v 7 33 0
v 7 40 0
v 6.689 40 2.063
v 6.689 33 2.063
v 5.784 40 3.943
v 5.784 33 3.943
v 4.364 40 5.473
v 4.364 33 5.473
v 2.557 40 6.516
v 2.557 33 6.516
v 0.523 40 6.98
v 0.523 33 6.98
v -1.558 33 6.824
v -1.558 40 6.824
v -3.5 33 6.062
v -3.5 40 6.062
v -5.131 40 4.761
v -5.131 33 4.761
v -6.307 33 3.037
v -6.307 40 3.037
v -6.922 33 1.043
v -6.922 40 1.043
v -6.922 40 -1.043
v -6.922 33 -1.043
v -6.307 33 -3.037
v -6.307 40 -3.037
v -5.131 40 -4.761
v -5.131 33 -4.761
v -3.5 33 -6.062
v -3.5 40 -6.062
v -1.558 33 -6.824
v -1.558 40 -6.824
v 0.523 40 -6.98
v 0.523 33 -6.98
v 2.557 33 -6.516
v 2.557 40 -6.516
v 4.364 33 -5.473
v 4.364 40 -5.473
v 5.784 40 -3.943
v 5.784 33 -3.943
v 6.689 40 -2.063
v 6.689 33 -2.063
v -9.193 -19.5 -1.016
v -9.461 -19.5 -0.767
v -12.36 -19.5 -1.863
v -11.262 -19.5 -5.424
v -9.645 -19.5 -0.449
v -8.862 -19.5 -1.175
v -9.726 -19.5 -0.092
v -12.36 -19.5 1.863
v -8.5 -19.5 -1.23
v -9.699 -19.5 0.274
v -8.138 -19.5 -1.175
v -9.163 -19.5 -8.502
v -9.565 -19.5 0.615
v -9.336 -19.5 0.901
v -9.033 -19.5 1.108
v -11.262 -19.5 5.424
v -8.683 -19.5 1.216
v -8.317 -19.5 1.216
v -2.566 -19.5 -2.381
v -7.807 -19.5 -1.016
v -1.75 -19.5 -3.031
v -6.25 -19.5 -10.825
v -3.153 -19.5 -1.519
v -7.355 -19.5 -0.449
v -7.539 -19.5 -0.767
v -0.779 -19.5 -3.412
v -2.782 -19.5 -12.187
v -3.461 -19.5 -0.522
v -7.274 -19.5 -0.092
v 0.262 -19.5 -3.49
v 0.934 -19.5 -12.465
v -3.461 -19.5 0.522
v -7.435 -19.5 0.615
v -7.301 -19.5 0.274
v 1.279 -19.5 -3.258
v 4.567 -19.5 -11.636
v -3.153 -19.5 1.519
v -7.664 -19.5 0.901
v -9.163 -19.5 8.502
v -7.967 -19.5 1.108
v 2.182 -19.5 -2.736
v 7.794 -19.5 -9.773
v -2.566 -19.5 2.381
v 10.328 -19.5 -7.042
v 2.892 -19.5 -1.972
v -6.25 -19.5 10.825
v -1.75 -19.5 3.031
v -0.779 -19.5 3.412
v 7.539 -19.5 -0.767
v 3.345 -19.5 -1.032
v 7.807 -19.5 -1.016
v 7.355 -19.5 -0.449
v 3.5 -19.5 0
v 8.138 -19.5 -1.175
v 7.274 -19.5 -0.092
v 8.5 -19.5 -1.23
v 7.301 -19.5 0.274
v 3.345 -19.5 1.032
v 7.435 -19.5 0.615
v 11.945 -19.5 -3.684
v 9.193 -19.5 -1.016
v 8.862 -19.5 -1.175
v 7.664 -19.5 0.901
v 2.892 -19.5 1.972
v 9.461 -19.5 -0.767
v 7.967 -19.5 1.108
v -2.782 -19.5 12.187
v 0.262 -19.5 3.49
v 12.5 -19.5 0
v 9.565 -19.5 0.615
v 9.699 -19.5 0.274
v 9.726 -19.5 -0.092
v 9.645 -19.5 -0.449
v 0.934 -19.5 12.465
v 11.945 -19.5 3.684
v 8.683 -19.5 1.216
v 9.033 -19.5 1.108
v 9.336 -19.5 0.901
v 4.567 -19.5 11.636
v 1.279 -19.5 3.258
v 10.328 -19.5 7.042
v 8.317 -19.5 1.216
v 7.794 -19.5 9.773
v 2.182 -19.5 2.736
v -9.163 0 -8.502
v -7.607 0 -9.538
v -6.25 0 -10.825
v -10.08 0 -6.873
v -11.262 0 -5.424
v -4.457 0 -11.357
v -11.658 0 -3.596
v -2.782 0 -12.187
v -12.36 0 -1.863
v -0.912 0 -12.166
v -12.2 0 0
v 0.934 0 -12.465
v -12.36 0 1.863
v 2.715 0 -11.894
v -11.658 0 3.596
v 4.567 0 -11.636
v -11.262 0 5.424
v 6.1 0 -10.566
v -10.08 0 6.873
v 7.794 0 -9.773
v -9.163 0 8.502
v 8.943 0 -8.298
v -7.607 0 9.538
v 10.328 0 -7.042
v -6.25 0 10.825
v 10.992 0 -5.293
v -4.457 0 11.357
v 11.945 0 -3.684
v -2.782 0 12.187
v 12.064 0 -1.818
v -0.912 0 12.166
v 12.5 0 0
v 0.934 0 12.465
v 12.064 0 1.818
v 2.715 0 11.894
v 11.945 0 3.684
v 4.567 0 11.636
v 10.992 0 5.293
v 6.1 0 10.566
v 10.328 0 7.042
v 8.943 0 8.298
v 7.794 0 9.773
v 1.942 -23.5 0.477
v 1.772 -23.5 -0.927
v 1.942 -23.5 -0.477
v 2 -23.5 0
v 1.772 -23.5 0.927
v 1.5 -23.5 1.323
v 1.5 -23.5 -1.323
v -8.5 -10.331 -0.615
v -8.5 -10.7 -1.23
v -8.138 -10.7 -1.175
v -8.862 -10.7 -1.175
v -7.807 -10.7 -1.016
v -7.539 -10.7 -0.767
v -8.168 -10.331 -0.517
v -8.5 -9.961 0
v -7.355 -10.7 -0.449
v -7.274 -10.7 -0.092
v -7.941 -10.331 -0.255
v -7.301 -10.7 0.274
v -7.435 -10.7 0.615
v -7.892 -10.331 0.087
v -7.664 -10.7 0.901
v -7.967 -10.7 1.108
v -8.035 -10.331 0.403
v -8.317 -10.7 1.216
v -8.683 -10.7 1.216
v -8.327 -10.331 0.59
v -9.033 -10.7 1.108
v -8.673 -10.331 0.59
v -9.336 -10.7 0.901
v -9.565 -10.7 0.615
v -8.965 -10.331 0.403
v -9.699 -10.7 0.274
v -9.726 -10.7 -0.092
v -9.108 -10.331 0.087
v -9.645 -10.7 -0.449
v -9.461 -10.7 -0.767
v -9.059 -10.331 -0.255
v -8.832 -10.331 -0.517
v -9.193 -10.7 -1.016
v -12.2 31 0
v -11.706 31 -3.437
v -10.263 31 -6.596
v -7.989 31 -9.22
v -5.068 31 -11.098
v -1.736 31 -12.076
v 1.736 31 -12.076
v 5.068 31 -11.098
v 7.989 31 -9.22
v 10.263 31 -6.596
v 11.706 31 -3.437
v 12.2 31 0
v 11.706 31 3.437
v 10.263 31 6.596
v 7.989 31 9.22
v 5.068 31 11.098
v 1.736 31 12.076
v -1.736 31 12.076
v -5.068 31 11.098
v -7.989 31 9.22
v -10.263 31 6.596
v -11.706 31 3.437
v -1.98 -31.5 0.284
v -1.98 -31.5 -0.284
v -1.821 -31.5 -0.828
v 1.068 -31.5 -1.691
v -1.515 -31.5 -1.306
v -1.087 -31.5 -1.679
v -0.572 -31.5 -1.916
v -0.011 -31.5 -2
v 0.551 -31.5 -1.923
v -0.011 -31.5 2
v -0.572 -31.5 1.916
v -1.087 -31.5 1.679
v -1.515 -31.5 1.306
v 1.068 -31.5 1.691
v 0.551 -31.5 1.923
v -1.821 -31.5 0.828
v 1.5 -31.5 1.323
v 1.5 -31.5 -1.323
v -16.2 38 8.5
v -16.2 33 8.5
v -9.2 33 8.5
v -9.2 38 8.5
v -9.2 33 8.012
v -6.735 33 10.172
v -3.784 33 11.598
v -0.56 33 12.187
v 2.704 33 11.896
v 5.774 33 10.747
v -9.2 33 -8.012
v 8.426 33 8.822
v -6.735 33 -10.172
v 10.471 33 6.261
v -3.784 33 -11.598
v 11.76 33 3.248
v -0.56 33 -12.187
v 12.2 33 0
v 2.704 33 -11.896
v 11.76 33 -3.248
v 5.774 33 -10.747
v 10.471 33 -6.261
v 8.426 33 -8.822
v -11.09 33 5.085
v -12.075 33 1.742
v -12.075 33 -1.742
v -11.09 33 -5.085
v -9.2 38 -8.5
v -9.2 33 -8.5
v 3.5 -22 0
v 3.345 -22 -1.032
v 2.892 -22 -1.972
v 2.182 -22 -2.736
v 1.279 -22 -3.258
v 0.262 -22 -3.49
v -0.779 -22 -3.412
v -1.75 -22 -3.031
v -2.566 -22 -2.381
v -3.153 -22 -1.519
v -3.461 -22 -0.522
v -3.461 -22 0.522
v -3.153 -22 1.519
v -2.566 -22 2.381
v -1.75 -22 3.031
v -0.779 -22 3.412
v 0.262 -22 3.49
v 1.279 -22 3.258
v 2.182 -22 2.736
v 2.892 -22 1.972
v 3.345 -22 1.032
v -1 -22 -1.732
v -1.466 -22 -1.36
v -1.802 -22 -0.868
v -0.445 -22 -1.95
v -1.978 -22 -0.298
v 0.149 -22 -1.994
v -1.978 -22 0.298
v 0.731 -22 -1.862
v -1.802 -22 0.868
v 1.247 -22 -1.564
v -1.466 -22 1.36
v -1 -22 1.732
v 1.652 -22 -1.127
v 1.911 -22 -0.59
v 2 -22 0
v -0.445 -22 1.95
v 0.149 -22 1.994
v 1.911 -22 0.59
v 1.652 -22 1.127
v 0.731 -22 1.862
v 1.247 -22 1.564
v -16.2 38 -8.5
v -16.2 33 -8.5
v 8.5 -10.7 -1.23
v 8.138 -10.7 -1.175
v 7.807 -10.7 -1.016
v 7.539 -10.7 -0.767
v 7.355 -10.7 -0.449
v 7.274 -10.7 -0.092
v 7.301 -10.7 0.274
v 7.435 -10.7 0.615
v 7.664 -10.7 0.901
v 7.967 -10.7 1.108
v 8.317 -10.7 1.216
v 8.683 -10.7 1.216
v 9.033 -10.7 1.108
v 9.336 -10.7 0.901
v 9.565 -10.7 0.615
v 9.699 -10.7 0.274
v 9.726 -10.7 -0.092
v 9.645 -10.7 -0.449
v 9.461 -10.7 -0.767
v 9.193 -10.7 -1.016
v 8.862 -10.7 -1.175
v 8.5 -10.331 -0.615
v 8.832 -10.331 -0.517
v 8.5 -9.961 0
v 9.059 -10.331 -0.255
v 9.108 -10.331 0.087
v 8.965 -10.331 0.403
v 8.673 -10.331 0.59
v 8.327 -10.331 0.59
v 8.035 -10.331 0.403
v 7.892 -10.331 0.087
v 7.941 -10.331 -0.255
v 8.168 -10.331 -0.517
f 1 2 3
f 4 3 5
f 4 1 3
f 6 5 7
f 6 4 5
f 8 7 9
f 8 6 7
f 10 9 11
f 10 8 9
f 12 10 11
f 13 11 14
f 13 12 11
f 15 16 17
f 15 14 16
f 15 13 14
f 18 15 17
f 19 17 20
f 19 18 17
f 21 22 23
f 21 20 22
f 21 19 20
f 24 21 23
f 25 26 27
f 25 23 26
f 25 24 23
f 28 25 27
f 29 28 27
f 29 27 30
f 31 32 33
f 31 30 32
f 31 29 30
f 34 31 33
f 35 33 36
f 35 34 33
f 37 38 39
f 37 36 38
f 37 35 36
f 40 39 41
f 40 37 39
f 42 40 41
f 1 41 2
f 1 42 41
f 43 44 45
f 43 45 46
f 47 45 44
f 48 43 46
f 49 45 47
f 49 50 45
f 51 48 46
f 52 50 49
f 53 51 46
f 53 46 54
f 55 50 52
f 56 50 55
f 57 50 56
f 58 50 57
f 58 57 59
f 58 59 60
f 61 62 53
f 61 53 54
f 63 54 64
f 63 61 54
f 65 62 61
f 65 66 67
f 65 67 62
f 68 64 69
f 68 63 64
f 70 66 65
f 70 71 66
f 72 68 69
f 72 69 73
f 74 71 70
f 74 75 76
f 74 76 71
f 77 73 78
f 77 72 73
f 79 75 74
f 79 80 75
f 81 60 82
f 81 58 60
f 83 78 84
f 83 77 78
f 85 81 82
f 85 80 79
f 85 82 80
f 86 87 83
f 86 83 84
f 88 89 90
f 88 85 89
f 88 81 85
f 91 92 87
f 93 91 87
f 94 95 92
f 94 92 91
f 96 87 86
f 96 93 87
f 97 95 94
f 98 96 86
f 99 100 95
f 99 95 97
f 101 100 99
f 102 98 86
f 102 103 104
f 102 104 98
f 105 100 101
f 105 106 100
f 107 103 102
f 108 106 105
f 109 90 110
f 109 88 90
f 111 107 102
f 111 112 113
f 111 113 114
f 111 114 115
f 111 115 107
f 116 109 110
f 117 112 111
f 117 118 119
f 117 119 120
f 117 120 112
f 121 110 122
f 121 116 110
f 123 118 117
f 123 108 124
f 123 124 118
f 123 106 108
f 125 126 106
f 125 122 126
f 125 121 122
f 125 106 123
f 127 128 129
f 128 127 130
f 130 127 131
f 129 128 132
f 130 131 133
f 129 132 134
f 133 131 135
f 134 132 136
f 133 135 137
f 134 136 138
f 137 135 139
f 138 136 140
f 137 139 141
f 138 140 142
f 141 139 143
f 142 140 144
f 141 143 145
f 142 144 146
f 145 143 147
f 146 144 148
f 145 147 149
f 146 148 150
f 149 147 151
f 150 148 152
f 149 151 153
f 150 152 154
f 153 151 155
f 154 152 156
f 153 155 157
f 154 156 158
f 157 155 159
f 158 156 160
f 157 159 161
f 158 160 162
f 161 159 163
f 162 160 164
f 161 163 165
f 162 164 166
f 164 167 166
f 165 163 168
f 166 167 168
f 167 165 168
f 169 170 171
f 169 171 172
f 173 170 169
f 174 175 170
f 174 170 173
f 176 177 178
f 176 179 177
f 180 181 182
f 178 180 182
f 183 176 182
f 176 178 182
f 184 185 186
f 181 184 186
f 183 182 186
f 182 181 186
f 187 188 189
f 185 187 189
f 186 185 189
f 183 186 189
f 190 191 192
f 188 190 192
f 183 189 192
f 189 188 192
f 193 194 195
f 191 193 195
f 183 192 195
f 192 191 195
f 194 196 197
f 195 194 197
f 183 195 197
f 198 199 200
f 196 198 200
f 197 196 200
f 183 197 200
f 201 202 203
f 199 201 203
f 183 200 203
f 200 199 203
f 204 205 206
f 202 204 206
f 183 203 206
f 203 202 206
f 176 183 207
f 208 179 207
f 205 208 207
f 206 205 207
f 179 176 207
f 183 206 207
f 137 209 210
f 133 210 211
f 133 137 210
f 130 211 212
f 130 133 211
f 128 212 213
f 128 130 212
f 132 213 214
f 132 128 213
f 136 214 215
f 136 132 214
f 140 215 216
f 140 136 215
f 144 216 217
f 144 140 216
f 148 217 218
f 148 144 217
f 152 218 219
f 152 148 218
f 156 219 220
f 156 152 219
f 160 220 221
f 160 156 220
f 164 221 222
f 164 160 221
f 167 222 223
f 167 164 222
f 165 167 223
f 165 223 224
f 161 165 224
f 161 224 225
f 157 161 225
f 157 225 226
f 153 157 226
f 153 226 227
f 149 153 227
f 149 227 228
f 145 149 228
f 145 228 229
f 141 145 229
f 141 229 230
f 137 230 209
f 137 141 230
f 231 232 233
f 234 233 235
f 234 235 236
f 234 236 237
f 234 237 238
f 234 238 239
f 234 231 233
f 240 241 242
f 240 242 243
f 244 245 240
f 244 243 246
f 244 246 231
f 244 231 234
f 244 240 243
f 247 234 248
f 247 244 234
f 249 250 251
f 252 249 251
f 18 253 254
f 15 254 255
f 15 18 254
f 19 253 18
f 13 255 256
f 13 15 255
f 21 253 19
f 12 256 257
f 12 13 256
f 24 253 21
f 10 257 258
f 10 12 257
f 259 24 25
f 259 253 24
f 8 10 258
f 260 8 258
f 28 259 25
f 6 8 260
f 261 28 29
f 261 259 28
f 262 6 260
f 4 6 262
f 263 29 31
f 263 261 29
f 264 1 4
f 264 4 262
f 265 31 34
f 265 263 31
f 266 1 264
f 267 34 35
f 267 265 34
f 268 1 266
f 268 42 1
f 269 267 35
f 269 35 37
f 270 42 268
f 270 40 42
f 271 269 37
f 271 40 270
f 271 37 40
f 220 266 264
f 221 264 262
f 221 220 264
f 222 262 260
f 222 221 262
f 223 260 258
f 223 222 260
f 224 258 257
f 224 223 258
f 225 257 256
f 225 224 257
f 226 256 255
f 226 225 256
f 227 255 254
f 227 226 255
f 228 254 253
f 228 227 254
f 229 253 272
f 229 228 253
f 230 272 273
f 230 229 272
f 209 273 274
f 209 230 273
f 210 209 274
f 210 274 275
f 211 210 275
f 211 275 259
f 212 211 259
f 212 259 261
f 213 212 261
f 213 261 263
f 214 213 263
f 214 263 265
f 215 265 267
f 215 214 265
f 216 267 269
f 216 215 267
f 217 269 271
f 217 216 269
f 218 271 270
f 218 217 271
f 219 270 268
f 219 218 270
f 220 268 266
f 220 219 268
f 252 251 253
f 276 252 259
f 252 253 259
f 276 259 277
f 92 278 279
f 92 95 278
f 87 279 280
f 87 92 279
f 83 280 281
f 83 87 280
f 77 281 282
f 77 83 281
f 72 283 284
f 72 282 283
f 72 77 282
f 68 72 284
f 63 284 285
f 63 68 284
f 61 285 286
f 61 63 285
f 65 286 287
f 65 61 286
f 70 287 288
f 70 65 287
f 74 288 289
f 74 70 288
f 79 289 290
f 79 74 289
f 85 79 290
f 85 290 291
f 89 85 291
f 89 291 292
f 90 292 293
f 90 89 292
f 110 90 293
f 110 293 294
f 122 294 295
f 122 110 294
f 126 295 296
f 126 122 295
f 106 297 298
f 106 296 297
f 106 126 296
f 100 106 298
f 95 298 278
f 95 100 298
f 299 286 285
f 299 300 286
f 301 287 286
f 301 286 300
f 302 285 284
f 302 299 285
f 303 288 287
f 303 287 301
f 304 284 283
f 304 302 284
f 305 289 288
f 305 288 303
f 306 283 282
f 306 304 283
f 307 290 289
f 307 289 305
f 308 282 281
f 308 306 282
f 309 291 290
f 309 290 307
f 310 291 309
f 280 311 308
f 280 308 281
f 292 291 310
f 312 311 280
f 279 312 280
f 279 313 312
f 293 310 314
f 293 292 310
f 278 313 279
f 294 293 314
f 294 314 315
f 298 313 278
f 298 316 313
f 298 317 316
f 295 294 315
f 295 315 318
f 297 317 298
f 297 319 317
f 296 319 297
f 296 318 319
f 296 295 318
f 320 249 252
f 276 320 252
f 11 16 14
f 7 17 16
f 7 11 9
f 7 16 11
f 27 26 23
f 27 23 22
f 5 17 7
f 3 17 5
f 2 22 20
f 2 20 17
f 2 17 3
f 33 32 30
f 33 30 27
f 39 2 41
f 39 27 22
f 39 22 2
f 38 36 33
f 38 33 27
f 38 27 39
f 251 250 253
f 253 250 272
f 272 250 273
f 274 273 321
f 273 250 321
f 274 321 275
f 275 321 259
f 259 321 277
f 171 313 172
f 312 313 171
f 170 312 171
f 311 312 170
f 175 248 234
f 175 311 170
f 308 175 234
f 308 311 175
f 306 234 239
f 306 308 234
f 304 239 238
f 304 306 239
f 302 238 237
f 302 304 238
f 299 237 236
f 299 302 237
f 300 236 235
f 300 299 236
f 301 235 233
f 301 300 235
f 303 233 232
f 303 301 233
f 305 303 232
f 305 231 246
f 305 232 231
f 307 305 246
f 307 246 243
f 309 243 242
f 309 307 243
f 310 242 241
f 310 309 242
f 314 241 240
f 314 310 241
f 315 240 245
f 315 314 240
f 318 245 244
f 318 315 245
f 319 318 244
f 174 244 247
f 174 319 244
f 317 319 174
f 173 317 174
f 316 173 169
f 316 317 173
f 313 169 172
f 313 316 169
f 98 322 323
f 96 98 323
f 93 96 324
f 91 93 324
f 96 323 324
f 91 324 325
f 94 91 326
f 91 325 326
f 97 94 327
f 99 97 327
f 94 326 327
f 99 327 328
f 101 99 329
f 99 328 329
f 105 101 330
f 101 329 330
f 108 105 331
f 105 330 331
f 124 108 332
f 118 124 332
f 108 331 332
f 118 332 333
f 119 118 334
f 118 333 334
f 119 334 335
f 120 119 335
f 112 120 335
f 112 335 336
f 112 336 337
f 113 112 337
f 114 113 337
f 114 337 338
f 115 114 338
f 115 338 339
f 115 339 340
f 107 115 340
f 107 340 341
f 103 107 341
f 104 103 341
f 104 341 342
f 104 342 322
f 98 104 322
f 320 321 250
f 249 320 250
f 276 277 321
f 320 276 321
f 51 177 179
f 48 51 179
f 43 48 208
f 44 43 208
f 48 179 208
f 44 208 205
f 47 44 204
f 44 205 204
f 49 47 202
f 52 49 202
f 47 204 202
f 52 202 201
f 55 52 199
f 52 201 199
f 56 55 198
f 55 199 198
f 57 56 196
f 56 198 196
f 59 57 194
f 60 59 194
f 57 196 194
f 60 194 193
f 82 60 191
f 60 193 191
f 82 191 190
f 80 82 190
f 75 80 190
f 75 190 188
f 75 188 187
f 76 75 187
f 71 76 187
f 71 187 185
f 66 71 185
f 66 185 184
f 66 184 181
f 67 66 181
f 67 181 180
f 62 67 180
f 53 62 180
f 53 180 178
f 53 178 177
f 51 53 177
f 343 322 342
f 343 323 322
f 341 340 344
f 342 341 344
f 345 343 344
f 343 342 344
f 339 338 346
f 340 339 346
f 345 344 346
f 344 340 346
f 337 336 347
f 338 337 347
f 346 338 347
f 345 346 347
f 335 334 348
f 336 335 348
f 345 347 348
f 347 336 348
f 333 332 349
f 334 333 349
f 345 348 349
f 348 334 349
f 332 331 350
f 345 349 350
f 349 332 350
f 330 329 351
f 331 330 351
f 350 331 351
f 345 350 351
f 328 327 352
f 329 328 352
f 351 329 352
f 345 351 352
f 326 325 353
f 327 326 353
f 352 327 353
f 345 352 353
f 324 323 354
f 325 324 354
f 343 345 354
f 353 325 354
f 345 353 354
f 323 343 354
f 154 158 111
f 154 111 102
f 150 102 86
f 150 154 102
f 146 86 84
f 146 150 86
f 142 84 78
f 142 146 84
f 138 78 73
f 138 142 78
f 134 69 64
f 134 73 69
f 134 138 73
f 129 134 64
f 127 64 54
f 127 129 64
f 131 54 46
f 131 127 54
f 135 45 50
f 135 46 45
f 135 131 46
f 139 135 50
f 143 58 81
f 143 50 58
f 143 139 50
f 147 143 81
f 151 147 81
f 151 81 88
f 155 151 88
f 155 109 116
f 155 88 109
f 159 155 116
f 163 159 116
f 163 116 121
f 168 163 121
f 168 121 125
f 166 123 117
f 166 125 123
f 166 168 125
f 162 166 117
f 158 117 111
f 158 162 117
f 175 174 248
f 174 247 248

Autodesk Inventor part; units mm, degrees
ref_plane "YZ Plane" through (0, 0, 0) normal (1, 0, 0) x (0, 1, 0)
ref_plane "XZ Plane" through (0, 0, 0) normal (0, 1, 0) x (-1, 0, 0)
ref_plane "XY Plane" through (0, 0, 0) normal (0, 0, 1) x (1, 0, 0)
sketch "Schizzo1" plane through (0, 0, 0) normal (0, 1, 0) x (-1, 0, 0)
  circle A0 centre (0, 0) radius 12.2
  dimension "d0" = 24.4
extrude "Estrusione1" add sketch "Schizzo1" along normal blind 31
sketch "Schizzo2" plane through (0, 0, 0) normal (0, -1, 0) x (1, 0, 0)
  circle A0 centre (0, 0) radius 12.5
  dimension "d3" = 25
extrude "Estrusione2" add sketch "Schizzo2" along normal blind 19.5
sketch "Schizzo3" plane through (0, -19.5, 0) normal (0, -1, 0) x (1, 0, 0)
  circle A0 centre (0, 0) radius 12.2 projected
  circle A1 centre (0, 0) radius 3.5
  dimension "d6" = 7
extrude "Estrusione3" add sketch "Schizzo3" along normal blind 2.5 contours A1
sketch "Schizzo4" plane through (0, -22, 0) normal (0, -1, 0) x (1, 0, 0)
  circle A0 centre (0, 0) radius 2
  dimension "d9" = 4
extrude "Estrusione4" add sketch "Schizzo4" along normal blind 9.5
sketch "Schizzo5" plane through (0, -31.5, 0) normal (0, -1, 0) x (1, 0, 0)
  circle A0 centre (0, 0) radius 2 projected
  line L0 (-2, 0) -> (1.5, 0)
  line L1 (1.5, 0) -> (1.5, -1.3229)
  line L2 (1.5, 0) -> (1.5, 1.3229)
  dimension "d12" = 3.5
extrude "Estrusione5" cut sketch "Schizzo5" against normal blind 8 contours A0 L1 L2
sketch "Schizzo6" plane through (0, -19.5, 0) normal (0, -1, 0) x (1, 0, 0)
  line L0 (0, 0) -> (8.5, 0)
  circle A0 centre (8.5, 0) radius 1.5
  line L1 (8.5, 0) -> (-8.5, 0)
  line L2 (8.5, 0) -> (25.5, 0) construction
  circle A1 centre (-8.5, 0) radius 1.5
  dimension "d15" = 8.5
  dimension "d16" = 3
  dimension "d17" = 17
  dimension "d18" = 180
  dimension "d19" = 3
hole "Foro1" at (8.5, -19.5, 0) at (-8.5, -19.5, 0) direction (0, 1, 0) diameter 2.459 depth 8.8 tip angle 118 thread size "M3x0.5" class "6H" standard "ANSI Metric M Profile"
sketch "Schizzo7" plane through (0, 31, 0) normal (0, 1, 0) x (1, 0, 0)
  point P0 (0, 0)
sketch "Schizzo8" plane through (0, 31, 0) normal (0, 1, 0) x (1, 0, 0)
  circle A0 centre (0, 0) radius 7
  dimension "d30" = 14
extrude "Estrusione6" add sketch "Schizzo8" along normal blind 9 from surface at 0
sketch "Schizzo9" plane through (0, 31, 0) normal (0, 1, 0) x (1, 0, 0)
  circle A0 centre (0, 0) radius 12.2
  dimension "d31" = 24.4
extrude "Estrusione7" add sketch "Schizzo9" along normal blind 2
sketch "Schizzo10" plane through (0, 33, 0) normal (0, 1, 0) x (1, 0, 0)
  circle A0 centre (0, 0) radius 12.2 projected
  line L0 (-12.2, 0) -> (-9.2, 0)
  line L1 (-9.2, 8.5) -> (-16.2, 8.5)
  line L2 (-16.2, 8.5) -> (-16.2, -8.5)
  line L3 (-16.2, -8.5) -> (-9.2, -8.5)
  line L4 (-9.2, -8.5) -> (-9.2, 8.5)
  dimension "d34" = 3
  dimension "d35" = 17
  dimension "d36" = 7
extrude "Estrusione8" add sketch "Schizzo10" along normal blind 5 contours L4 L0 A0 | A0 L4 L3 L2 L1 | A0 L0 L4
properties part number "7_Motore" material "M.Motore"
